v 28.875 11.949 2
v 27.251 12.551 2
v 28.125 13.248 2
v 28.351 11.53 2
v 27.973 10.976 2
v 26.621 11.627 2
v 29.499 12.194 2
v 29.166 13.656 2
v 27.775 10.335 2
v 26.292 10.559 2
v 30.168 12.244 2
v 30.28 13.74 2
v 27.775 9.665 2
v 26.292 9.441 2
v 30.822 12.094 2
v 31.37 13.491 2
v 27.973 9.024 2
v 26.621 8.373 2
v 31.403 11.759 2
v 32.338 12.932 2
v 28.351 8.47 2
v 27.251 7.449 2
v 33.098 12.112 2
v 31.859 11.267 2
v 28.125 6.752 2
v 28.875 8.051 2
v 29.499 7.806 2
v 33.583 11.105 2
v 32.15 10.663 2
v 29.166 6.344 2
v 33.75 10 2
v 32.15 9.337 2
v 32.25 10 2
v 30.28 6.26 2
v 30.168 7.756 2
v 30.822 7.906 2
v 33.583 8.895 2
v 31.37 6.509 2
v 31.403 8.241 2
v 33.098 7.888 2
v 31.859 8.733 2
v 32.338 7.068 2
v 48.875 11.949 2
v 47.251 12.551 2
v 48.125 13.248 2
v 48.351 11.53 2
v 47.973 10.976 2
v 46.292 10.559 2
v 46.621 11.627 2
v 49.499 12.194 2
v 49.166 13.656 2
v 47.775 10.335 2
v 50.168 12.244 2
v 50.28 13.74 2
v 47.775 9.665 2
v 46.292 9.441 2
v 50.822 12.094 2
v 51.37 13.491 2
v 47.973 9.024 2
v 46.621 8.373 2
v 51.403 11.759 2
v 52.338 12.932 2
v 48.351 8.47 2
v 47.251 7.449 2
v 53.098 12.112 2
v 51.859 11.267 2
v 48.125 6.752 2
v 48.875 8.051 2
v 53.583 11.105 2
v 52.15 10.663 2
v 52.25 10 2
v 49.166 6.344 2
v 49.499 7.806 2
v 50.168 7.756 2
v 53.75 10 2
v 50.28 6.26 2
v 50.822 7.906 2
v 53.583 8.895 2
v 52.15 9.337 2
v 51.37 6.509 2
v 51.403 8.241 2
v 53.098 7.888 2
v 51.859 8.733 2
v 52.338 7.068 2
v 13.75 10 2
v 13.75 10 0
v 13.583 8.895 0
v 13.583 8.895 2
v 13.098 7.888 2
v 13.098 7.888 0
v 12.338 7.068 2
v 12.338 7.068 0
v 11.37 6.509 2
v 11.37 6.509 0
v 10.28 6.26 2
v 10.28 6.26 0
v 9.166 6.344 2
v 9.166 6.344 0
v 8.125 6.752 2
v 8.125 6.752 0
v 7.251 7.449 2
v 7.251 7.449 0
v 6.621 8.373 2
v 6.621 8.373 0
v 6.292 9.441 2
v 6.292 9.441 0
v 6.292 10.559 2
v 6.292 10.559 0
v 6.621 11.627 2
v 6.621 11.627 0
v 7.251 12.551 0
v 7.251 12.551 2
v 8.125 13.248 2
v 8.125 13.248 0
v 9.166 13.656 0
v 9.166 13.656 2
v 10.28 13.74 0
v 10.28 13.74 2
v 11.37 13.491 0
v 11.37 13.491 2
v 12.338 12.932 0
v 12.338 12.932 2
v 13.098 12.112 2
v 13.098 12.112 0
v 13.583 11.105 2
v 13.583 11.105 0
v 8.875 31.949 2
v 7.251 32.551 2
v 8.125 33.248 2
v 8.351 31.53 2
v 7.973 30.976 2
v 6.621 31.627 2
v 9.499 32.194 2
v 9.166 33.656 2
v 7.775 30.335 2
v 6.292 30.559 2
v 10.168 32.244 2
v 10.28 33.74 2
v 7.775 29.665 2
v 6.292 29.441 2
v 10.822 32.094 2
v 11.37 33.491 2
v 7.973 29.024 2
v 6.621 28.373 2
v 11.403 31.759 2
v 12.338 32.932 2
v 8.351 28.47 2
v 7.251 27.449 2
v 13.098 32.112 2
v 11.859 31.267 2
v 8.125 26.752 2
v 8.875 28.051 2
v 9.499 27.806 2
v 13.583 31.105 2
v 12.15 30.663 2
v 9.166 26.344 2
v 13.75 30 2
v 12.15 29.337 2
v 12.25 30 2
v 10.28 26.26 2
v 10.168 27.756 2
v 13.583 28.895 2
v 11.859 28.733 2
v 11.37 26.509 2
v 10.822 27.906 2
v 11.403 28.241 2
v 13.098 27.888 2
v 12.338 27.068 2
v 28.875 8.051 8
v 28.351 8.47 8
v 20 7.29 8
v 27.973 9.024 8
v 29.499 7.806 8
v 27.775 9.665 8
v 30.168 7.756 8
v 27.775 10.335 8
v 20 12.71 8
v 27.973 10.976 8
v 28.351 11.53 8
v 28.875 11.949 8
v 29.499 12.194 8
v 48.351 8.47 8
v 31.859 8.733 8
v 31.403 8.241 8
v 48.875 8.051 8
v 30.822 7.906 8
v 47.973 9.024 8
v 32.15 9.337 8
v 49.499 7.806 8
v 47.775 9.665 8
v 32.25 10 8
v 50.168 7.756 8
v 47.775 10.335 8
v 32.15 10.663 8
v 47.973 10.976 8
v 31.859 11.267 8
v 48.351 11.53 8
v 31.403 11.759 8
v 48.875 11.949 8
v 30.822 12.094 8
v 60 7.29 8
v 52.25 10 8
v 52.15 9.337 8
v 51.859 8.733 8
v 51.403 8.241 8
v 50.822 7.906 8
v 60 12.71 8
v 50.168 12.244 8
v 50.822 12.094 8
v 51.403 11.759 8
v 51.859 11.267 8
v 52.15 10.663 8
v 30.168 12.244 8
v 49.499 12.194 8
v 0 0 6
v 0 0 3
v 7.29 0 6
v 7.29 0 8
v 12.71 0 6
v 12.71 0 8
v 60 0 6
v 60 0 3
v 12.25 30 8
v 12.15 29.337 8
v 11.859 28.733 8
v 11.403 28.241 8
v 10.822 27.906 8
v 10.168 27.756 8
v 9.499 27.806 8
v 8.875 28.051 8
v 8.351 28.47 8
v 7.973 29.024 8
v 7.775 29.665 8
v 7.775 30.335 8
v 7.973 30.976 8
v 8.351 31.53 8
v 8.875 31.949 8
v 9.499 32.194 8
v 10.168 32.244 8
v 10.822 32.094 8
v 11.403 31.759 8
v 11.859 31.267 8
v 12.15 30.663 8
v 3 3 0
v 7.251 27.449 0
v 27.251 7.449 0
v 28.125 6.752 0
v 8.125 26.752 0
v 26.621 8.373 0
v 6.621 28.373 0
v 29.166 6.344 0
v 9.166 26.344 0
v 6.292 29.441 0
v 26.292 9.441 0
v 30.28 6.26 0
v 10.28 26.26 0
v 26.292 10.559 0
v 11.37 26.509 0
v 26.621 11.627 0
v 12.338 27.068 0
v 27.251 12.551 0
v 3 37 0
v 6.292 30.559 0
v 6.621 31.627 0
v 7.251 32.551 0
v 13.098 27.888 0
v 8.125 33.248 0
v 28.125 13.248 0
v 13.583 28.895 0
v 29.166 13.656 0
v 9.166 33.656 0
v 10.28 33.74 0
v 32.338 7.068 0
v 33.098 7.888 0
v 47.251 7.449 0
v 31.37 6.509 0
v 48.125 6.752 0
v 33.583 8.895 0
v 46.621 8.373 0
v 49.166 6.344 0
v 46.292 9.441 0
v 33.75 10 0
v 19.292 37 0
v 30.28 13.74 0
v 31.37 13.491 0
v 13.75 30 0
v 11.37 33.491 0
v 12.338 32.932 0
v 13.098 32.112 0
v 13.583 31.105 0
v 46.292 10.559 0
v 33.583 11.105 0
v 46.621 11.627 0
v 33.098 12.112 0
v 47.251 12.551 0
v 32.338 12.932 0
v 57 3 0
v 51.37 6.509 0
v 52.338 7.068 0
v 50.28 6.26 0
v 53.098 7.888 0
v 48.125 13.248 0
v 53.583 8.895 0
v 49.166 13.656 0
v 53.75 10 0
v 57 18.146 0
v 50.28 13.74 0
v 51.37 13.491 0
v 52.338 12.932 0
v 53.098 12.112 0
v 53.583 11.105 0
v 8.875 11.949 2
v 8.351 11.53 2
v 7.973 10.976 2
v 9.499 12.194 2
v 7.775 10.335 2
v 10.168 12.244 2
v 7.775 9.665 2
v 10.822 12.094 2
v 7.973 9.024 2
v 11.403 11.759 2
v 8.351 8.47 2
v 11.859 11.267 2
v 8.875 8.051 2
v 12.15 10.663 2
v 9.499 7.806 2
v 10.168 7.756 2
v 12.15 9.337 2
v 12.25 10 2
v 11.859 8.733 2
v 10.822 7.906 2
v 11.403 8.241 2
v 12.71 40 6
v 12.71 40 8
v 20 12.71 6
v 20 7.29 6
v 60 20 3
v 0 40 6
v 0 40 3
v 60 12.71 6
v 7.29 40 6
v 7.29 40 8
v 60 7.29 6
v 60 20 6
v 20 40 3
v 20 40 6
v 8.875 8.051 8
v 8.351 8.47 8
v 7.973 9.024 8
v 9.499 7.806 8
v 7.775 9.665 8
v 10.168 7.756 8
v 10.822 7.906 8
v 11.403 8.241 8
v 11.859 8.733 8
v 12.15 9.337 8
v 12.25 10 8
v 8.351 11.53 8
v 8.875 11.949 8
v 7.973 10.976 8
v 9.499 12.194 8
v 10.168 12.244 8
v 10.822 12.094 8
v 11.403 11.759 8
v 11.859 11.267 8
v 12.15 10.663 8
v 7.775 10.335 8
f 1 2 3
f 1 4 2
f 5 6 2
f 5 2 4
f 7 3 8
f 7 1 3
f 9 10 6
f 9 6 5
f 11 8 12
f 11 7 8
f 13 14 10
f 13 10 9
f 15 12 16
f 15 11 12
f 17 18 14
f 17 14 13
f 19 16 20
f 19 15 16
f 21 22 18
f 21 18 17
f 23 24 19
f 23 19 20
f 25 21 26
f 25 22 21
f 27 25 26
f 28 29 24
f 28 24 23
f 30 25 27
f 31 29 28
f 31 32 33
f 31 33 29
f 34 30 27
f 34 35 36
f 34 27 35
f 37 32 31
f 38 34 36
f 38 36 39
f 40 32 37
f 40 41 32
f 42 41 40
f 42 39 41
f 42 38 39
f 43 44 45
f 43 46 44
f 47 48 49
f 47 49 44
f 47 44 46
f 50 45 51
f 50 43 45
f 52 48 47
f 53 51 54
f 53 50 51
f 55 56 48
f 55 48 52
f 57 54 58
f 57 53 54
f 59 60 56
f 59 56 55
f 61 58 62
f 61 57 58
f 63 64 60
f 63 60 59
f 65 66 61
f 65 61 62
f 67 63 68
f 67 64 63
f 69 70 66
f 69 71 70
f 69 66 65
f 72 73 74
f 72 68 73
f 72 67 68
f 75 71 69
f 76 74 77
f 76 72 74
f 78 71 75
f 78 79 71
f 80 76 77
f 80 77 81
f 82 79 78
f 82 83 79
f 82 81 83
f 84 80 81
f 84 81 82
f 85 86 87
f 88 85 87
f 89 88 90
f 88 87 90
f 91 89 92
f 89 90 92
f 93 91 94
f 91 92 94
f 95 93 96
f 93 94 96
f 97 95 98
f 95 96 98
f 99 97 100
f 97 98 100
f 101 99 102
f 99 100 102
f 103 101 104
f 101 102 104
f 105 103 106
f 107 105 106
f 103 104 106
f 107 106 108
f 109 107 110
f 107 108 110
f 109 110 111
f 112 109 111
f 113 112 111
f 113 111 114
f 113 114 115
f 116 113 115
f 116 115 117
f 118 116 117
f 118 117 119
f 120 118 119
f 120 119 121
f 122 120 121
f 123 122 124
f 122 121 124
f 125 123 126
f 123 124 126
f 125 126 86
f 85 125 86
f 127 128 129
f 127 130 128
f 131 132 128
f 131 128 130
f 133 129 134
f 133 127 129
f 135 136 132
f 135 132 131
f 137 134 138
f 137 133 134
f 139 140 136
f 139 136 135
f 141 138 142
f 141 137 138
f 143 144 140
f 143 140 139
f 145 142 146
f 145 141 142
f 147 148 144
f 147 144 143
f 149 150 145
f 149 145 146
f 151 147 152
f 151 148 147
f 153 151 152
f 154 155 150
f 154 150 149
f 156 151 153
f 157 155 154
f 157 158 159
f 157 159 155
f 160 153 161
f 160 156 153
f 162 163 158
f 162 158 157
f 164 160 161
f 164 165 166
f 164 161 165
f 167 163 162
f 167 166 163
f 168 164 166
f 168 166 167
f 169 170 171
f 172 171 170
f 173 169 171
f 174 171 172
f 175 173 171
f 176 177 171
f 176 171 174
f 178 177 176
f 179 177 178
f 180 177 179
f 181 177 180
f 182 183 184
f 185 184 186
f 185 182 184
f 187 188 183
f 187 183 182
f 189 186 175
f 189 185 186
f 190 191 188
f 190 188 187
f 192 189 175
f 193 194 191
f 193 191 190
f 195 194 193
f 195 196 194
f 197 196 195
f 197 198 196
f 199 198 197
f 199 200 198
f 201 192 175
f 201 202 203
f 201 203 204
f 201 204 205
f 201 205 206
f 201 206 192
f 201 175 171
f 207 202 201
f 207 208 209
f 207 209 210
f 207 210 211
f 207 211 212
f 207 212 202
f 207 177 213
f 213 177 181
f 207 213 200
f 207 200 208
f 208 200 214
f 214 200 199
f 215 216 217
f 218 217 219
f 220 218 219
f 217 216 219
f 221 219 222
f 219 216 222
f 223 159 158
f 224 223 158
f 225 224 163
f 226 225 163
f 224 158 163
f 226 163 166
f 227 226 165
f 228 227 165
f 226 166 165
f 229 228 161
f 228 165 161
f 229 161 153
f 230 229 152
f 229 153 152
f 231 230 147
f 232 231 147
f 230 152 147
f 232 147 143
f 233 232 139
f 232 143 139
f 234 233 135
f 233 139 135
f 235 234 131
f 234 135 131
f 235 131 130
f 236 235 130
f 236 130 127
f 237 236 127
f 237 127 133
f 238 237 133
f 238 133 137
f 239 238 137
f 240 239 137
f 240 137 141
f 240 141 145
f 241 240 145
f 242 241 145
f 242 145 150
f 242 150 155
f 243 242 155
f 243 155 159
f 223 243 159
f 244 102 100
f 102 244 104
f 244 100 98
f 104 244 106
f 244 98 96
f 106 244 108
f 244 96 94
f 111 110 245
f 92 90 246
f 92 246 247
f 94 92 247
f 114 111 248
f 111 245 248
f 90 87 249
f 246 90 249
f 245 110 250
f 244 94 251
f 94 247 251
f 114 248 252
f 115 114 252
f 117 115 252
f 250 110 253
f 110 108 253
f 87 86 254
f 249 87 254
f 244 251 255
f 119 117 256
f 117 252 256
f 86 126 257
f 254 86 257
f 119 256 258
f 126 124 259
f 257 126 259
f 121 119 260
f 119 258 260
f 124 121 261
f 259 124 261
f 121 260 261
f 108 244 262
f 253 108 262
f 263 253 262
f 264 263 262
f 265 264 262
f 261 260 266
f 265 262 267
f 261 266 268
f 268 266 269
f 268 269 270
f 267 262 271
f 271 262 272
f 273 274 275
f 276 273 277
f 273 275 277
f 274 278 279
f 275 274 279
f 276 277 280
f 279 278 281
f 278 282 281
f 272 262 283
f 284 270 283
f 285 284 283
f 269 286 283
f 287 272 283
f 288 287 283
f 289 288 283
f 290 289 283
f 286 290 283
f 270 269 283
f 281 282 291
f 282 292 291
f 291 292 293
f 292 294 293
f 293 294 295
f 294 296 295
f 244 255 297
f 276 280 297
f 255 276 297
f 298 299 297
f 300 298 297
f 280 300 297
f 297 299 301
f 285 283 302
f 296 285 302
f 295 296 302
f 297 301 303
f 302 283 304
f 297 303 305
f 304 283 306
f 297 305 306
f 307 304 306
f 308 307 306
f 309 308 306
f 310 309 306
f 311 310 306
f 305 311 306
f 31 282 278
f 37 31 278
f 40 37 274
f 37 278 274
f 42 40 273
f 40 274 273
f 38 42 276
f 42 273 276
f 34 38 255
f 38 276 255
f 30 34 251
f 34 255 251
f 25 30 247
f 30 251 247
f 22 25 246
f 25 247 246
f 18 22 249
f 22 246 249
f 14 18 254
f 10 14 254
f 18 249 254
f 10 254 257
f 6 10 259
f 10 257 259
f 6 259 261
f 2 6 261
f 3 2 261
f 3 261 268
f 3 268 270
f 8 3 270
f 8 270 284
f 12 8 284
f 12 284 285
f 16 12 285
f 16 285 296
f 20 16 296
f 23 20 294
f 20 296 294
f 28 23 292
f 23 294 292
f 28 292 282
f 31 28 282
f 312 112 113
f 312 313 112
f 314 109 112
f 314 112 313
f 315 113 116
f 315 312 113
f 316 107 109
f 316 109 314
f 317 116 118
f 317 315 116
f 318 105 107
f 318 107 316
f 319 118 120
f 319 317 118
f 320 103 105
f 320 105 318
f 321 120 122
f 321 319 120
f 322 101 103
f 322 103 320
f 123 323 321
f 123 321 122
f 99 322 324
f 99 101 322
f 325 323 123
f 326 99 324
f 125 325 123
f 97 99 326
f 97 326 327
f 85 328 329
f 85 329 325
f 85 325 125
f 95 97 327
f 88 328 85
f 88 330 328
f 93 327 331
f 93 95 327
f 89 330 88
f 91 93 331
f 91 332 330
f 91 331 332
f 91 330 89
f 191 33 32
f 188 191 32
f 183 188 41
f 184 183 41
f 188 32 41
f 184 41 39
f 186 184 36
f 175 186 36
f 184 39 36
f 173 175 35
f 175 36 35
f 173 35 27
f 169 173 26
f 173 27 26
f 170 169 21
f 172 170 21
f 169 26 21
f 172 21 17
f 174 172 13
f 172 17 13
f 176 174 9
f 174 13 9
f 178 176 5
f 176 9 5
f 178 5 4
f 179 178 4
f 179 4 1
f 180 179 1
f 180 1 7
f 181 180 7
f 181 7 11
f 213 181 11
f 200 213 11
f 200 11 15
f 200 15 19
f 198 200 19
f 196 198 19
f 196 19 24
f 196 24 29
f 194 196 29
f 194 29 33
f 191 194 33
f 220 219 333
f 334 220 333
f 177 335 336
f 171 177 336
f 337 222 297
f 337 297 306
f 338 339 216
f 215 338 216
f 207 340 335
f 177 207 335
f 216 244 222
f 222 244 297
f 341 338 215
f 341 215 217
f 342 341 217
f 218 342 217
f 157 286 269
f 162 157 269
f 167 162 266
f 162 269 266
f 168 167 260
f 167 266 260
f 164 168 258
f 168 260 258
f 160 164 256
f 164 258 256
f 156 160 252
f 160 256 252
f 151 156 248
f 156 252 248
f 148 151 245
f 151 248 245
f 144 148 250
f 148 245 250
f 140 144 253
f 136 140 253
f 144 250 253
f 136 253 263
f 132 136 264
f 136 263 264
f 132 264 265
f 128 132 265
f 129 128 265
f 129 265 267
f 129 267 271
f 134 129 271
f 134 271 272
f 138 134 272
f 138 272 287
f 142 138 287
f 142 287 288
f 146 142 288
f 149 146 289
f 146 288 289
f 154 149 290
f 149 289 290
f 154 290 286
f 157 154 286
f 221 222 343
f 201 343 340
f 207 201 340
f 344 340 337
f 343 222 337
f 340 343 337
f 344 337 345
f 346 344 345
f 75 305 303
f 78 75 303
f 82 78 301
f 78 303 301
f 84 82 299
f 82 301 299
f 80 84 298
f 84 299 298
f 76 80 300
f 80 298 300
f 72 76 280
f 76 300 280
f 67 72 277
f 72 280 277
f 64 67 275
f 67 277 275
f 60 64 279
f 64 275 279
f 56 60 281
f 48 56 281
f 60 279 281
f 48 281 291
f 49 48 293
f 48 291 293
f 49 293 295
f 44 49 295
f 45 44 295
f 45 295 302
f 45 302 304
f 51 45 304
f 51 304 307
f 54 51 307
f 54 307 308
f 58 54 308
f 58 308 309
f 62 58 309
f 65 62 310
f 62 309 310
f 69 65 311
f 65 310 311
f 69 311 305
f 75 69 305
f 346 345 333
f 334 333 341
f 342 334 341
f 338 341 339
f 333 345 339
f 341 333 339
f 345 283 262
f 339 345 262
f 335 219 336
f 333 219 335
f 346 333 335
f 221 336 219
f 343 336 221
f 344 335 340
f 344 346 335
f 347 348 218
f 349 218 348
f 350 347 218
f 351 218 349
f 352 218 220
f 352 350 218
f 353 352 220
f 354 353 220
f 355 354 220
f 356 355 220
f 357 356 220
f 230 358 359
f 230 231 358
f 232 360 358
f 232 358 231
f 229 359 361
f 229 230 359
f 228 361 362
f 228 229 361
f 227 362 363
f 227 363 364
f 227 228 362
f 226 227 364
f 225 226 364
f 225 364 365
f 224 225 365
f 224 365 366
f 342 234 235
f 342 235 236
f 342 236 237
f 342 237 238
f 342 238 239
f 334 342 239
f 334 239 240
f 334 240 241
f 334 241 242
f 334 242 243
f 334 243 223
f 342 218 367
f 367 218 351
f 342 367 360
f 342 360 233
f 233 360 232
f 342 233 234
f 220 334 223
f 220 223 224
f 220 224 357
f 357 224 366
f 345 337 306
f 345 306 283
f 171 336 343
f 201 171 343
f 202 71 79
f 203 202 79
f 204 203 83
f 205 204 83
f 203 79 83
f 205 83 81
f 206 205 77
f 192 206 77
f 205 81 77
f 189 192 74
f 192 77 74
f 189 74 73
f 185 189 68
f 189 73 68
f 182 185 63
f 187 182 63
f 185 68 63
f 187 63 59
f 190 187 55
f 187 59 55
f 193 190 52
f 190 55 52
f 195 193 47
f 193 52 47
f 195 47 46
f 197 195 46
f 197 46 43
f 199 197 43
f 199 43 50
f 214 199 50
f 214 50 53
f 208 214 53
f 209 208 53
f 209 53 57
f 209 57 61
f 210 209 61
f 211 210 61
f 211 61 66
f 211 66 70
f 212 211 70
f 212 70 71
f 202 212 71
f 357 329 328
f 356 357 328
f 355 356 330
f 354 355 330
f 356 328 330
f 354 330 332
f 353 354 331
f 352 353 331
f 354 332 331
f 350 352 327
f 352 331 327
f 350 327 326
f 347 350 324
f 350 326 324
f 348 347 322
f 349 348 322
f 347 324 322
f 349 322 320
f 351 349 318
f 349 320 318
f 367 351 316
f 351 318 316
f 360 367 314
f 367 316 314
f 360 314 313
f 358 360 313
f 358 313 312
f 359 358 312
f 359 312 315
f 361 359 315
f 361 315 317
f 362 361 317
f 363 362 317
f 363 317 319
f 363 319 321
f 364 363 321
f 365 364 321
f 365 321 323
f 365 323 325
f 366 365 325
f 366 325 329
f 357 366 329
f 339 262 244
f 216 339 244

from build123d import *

# Parameters (mm, degrees)
F1_DEPTH = 6
F3_DEPTH = 2
F4_R     = 2.25
F5_DEPTH = 8.001
F6_R     = 3.75
F7_DEPTH = 2
F8_SIZE  = 3


with BuildPart() as f1:
    # F0 (on Top) → F1 (new body)
    with BuildSketch(Plane.XY):
        Polygon((0, 40), (0, 0), (60, 0), (60, 20), (20, 40), align=None)
    extrude(amount=F1_DEPTH)

    # F2 (on face) → F3 (join)
    with BuildSketch(Plane.XY.offset(6)):
        Polygon((12.71, 40), (7.29, 40), (7.29, 0), (10, 0), (12.71, 0), align=None)
        Polygon((60, 7.29), (60, 12.71), (20, 12.71), (20, 10), (20, 7.29), align=None)
    extrude(amount=F3_DEPTH)

    # F4 (on face) → F5 (cut, through all)
    with BuildSketch(Plane(origin=(0, 0, 0), x_dir=(1, 0, 0), z_dir=(0, 0, -1))):
        with Locations((10, -10)):
            Circle(F4_R)
        with Locations((50, -10)):
            Circle(F4_R)
        with Locations((10, -30)):
            Circle(F4_R)
        with Locations((30, -10)):
            Circle(F4_R)
    extrude(amount=-F5_DEPTH, mode=Mode.SUBTRACT)

    # F6 (on face) → F7 (cut)
    with BuildSketch(Plane(origin=(0, 0, 0), x_dir=(1, 0, 0), z_dir=(0, 0, -1))):
        with Locations((10, -10)):
            Circle(F6_R)
        with Locations((30, -10)):
            Circle(F6_R)
        with Locations((50, -10)):
            Circle(F6_R)
        with Locations((10, -30)):
            Circle(F6_R)
    extrude(amount=-F7_DEPTH, mode=Mode.SUBTRACT)

    # F8
    f8_edges = [f1.edges().sort_by_distance(p)[0] for p in [
        (30, 0, 0),
        (0, 20, 0),
        (60, 10, 0),
        (10, 40, 0),
        (40, 30, 0),
    ]]
    chamfer(f8_edges, length=F8_SIZE)


solid = f1.part
